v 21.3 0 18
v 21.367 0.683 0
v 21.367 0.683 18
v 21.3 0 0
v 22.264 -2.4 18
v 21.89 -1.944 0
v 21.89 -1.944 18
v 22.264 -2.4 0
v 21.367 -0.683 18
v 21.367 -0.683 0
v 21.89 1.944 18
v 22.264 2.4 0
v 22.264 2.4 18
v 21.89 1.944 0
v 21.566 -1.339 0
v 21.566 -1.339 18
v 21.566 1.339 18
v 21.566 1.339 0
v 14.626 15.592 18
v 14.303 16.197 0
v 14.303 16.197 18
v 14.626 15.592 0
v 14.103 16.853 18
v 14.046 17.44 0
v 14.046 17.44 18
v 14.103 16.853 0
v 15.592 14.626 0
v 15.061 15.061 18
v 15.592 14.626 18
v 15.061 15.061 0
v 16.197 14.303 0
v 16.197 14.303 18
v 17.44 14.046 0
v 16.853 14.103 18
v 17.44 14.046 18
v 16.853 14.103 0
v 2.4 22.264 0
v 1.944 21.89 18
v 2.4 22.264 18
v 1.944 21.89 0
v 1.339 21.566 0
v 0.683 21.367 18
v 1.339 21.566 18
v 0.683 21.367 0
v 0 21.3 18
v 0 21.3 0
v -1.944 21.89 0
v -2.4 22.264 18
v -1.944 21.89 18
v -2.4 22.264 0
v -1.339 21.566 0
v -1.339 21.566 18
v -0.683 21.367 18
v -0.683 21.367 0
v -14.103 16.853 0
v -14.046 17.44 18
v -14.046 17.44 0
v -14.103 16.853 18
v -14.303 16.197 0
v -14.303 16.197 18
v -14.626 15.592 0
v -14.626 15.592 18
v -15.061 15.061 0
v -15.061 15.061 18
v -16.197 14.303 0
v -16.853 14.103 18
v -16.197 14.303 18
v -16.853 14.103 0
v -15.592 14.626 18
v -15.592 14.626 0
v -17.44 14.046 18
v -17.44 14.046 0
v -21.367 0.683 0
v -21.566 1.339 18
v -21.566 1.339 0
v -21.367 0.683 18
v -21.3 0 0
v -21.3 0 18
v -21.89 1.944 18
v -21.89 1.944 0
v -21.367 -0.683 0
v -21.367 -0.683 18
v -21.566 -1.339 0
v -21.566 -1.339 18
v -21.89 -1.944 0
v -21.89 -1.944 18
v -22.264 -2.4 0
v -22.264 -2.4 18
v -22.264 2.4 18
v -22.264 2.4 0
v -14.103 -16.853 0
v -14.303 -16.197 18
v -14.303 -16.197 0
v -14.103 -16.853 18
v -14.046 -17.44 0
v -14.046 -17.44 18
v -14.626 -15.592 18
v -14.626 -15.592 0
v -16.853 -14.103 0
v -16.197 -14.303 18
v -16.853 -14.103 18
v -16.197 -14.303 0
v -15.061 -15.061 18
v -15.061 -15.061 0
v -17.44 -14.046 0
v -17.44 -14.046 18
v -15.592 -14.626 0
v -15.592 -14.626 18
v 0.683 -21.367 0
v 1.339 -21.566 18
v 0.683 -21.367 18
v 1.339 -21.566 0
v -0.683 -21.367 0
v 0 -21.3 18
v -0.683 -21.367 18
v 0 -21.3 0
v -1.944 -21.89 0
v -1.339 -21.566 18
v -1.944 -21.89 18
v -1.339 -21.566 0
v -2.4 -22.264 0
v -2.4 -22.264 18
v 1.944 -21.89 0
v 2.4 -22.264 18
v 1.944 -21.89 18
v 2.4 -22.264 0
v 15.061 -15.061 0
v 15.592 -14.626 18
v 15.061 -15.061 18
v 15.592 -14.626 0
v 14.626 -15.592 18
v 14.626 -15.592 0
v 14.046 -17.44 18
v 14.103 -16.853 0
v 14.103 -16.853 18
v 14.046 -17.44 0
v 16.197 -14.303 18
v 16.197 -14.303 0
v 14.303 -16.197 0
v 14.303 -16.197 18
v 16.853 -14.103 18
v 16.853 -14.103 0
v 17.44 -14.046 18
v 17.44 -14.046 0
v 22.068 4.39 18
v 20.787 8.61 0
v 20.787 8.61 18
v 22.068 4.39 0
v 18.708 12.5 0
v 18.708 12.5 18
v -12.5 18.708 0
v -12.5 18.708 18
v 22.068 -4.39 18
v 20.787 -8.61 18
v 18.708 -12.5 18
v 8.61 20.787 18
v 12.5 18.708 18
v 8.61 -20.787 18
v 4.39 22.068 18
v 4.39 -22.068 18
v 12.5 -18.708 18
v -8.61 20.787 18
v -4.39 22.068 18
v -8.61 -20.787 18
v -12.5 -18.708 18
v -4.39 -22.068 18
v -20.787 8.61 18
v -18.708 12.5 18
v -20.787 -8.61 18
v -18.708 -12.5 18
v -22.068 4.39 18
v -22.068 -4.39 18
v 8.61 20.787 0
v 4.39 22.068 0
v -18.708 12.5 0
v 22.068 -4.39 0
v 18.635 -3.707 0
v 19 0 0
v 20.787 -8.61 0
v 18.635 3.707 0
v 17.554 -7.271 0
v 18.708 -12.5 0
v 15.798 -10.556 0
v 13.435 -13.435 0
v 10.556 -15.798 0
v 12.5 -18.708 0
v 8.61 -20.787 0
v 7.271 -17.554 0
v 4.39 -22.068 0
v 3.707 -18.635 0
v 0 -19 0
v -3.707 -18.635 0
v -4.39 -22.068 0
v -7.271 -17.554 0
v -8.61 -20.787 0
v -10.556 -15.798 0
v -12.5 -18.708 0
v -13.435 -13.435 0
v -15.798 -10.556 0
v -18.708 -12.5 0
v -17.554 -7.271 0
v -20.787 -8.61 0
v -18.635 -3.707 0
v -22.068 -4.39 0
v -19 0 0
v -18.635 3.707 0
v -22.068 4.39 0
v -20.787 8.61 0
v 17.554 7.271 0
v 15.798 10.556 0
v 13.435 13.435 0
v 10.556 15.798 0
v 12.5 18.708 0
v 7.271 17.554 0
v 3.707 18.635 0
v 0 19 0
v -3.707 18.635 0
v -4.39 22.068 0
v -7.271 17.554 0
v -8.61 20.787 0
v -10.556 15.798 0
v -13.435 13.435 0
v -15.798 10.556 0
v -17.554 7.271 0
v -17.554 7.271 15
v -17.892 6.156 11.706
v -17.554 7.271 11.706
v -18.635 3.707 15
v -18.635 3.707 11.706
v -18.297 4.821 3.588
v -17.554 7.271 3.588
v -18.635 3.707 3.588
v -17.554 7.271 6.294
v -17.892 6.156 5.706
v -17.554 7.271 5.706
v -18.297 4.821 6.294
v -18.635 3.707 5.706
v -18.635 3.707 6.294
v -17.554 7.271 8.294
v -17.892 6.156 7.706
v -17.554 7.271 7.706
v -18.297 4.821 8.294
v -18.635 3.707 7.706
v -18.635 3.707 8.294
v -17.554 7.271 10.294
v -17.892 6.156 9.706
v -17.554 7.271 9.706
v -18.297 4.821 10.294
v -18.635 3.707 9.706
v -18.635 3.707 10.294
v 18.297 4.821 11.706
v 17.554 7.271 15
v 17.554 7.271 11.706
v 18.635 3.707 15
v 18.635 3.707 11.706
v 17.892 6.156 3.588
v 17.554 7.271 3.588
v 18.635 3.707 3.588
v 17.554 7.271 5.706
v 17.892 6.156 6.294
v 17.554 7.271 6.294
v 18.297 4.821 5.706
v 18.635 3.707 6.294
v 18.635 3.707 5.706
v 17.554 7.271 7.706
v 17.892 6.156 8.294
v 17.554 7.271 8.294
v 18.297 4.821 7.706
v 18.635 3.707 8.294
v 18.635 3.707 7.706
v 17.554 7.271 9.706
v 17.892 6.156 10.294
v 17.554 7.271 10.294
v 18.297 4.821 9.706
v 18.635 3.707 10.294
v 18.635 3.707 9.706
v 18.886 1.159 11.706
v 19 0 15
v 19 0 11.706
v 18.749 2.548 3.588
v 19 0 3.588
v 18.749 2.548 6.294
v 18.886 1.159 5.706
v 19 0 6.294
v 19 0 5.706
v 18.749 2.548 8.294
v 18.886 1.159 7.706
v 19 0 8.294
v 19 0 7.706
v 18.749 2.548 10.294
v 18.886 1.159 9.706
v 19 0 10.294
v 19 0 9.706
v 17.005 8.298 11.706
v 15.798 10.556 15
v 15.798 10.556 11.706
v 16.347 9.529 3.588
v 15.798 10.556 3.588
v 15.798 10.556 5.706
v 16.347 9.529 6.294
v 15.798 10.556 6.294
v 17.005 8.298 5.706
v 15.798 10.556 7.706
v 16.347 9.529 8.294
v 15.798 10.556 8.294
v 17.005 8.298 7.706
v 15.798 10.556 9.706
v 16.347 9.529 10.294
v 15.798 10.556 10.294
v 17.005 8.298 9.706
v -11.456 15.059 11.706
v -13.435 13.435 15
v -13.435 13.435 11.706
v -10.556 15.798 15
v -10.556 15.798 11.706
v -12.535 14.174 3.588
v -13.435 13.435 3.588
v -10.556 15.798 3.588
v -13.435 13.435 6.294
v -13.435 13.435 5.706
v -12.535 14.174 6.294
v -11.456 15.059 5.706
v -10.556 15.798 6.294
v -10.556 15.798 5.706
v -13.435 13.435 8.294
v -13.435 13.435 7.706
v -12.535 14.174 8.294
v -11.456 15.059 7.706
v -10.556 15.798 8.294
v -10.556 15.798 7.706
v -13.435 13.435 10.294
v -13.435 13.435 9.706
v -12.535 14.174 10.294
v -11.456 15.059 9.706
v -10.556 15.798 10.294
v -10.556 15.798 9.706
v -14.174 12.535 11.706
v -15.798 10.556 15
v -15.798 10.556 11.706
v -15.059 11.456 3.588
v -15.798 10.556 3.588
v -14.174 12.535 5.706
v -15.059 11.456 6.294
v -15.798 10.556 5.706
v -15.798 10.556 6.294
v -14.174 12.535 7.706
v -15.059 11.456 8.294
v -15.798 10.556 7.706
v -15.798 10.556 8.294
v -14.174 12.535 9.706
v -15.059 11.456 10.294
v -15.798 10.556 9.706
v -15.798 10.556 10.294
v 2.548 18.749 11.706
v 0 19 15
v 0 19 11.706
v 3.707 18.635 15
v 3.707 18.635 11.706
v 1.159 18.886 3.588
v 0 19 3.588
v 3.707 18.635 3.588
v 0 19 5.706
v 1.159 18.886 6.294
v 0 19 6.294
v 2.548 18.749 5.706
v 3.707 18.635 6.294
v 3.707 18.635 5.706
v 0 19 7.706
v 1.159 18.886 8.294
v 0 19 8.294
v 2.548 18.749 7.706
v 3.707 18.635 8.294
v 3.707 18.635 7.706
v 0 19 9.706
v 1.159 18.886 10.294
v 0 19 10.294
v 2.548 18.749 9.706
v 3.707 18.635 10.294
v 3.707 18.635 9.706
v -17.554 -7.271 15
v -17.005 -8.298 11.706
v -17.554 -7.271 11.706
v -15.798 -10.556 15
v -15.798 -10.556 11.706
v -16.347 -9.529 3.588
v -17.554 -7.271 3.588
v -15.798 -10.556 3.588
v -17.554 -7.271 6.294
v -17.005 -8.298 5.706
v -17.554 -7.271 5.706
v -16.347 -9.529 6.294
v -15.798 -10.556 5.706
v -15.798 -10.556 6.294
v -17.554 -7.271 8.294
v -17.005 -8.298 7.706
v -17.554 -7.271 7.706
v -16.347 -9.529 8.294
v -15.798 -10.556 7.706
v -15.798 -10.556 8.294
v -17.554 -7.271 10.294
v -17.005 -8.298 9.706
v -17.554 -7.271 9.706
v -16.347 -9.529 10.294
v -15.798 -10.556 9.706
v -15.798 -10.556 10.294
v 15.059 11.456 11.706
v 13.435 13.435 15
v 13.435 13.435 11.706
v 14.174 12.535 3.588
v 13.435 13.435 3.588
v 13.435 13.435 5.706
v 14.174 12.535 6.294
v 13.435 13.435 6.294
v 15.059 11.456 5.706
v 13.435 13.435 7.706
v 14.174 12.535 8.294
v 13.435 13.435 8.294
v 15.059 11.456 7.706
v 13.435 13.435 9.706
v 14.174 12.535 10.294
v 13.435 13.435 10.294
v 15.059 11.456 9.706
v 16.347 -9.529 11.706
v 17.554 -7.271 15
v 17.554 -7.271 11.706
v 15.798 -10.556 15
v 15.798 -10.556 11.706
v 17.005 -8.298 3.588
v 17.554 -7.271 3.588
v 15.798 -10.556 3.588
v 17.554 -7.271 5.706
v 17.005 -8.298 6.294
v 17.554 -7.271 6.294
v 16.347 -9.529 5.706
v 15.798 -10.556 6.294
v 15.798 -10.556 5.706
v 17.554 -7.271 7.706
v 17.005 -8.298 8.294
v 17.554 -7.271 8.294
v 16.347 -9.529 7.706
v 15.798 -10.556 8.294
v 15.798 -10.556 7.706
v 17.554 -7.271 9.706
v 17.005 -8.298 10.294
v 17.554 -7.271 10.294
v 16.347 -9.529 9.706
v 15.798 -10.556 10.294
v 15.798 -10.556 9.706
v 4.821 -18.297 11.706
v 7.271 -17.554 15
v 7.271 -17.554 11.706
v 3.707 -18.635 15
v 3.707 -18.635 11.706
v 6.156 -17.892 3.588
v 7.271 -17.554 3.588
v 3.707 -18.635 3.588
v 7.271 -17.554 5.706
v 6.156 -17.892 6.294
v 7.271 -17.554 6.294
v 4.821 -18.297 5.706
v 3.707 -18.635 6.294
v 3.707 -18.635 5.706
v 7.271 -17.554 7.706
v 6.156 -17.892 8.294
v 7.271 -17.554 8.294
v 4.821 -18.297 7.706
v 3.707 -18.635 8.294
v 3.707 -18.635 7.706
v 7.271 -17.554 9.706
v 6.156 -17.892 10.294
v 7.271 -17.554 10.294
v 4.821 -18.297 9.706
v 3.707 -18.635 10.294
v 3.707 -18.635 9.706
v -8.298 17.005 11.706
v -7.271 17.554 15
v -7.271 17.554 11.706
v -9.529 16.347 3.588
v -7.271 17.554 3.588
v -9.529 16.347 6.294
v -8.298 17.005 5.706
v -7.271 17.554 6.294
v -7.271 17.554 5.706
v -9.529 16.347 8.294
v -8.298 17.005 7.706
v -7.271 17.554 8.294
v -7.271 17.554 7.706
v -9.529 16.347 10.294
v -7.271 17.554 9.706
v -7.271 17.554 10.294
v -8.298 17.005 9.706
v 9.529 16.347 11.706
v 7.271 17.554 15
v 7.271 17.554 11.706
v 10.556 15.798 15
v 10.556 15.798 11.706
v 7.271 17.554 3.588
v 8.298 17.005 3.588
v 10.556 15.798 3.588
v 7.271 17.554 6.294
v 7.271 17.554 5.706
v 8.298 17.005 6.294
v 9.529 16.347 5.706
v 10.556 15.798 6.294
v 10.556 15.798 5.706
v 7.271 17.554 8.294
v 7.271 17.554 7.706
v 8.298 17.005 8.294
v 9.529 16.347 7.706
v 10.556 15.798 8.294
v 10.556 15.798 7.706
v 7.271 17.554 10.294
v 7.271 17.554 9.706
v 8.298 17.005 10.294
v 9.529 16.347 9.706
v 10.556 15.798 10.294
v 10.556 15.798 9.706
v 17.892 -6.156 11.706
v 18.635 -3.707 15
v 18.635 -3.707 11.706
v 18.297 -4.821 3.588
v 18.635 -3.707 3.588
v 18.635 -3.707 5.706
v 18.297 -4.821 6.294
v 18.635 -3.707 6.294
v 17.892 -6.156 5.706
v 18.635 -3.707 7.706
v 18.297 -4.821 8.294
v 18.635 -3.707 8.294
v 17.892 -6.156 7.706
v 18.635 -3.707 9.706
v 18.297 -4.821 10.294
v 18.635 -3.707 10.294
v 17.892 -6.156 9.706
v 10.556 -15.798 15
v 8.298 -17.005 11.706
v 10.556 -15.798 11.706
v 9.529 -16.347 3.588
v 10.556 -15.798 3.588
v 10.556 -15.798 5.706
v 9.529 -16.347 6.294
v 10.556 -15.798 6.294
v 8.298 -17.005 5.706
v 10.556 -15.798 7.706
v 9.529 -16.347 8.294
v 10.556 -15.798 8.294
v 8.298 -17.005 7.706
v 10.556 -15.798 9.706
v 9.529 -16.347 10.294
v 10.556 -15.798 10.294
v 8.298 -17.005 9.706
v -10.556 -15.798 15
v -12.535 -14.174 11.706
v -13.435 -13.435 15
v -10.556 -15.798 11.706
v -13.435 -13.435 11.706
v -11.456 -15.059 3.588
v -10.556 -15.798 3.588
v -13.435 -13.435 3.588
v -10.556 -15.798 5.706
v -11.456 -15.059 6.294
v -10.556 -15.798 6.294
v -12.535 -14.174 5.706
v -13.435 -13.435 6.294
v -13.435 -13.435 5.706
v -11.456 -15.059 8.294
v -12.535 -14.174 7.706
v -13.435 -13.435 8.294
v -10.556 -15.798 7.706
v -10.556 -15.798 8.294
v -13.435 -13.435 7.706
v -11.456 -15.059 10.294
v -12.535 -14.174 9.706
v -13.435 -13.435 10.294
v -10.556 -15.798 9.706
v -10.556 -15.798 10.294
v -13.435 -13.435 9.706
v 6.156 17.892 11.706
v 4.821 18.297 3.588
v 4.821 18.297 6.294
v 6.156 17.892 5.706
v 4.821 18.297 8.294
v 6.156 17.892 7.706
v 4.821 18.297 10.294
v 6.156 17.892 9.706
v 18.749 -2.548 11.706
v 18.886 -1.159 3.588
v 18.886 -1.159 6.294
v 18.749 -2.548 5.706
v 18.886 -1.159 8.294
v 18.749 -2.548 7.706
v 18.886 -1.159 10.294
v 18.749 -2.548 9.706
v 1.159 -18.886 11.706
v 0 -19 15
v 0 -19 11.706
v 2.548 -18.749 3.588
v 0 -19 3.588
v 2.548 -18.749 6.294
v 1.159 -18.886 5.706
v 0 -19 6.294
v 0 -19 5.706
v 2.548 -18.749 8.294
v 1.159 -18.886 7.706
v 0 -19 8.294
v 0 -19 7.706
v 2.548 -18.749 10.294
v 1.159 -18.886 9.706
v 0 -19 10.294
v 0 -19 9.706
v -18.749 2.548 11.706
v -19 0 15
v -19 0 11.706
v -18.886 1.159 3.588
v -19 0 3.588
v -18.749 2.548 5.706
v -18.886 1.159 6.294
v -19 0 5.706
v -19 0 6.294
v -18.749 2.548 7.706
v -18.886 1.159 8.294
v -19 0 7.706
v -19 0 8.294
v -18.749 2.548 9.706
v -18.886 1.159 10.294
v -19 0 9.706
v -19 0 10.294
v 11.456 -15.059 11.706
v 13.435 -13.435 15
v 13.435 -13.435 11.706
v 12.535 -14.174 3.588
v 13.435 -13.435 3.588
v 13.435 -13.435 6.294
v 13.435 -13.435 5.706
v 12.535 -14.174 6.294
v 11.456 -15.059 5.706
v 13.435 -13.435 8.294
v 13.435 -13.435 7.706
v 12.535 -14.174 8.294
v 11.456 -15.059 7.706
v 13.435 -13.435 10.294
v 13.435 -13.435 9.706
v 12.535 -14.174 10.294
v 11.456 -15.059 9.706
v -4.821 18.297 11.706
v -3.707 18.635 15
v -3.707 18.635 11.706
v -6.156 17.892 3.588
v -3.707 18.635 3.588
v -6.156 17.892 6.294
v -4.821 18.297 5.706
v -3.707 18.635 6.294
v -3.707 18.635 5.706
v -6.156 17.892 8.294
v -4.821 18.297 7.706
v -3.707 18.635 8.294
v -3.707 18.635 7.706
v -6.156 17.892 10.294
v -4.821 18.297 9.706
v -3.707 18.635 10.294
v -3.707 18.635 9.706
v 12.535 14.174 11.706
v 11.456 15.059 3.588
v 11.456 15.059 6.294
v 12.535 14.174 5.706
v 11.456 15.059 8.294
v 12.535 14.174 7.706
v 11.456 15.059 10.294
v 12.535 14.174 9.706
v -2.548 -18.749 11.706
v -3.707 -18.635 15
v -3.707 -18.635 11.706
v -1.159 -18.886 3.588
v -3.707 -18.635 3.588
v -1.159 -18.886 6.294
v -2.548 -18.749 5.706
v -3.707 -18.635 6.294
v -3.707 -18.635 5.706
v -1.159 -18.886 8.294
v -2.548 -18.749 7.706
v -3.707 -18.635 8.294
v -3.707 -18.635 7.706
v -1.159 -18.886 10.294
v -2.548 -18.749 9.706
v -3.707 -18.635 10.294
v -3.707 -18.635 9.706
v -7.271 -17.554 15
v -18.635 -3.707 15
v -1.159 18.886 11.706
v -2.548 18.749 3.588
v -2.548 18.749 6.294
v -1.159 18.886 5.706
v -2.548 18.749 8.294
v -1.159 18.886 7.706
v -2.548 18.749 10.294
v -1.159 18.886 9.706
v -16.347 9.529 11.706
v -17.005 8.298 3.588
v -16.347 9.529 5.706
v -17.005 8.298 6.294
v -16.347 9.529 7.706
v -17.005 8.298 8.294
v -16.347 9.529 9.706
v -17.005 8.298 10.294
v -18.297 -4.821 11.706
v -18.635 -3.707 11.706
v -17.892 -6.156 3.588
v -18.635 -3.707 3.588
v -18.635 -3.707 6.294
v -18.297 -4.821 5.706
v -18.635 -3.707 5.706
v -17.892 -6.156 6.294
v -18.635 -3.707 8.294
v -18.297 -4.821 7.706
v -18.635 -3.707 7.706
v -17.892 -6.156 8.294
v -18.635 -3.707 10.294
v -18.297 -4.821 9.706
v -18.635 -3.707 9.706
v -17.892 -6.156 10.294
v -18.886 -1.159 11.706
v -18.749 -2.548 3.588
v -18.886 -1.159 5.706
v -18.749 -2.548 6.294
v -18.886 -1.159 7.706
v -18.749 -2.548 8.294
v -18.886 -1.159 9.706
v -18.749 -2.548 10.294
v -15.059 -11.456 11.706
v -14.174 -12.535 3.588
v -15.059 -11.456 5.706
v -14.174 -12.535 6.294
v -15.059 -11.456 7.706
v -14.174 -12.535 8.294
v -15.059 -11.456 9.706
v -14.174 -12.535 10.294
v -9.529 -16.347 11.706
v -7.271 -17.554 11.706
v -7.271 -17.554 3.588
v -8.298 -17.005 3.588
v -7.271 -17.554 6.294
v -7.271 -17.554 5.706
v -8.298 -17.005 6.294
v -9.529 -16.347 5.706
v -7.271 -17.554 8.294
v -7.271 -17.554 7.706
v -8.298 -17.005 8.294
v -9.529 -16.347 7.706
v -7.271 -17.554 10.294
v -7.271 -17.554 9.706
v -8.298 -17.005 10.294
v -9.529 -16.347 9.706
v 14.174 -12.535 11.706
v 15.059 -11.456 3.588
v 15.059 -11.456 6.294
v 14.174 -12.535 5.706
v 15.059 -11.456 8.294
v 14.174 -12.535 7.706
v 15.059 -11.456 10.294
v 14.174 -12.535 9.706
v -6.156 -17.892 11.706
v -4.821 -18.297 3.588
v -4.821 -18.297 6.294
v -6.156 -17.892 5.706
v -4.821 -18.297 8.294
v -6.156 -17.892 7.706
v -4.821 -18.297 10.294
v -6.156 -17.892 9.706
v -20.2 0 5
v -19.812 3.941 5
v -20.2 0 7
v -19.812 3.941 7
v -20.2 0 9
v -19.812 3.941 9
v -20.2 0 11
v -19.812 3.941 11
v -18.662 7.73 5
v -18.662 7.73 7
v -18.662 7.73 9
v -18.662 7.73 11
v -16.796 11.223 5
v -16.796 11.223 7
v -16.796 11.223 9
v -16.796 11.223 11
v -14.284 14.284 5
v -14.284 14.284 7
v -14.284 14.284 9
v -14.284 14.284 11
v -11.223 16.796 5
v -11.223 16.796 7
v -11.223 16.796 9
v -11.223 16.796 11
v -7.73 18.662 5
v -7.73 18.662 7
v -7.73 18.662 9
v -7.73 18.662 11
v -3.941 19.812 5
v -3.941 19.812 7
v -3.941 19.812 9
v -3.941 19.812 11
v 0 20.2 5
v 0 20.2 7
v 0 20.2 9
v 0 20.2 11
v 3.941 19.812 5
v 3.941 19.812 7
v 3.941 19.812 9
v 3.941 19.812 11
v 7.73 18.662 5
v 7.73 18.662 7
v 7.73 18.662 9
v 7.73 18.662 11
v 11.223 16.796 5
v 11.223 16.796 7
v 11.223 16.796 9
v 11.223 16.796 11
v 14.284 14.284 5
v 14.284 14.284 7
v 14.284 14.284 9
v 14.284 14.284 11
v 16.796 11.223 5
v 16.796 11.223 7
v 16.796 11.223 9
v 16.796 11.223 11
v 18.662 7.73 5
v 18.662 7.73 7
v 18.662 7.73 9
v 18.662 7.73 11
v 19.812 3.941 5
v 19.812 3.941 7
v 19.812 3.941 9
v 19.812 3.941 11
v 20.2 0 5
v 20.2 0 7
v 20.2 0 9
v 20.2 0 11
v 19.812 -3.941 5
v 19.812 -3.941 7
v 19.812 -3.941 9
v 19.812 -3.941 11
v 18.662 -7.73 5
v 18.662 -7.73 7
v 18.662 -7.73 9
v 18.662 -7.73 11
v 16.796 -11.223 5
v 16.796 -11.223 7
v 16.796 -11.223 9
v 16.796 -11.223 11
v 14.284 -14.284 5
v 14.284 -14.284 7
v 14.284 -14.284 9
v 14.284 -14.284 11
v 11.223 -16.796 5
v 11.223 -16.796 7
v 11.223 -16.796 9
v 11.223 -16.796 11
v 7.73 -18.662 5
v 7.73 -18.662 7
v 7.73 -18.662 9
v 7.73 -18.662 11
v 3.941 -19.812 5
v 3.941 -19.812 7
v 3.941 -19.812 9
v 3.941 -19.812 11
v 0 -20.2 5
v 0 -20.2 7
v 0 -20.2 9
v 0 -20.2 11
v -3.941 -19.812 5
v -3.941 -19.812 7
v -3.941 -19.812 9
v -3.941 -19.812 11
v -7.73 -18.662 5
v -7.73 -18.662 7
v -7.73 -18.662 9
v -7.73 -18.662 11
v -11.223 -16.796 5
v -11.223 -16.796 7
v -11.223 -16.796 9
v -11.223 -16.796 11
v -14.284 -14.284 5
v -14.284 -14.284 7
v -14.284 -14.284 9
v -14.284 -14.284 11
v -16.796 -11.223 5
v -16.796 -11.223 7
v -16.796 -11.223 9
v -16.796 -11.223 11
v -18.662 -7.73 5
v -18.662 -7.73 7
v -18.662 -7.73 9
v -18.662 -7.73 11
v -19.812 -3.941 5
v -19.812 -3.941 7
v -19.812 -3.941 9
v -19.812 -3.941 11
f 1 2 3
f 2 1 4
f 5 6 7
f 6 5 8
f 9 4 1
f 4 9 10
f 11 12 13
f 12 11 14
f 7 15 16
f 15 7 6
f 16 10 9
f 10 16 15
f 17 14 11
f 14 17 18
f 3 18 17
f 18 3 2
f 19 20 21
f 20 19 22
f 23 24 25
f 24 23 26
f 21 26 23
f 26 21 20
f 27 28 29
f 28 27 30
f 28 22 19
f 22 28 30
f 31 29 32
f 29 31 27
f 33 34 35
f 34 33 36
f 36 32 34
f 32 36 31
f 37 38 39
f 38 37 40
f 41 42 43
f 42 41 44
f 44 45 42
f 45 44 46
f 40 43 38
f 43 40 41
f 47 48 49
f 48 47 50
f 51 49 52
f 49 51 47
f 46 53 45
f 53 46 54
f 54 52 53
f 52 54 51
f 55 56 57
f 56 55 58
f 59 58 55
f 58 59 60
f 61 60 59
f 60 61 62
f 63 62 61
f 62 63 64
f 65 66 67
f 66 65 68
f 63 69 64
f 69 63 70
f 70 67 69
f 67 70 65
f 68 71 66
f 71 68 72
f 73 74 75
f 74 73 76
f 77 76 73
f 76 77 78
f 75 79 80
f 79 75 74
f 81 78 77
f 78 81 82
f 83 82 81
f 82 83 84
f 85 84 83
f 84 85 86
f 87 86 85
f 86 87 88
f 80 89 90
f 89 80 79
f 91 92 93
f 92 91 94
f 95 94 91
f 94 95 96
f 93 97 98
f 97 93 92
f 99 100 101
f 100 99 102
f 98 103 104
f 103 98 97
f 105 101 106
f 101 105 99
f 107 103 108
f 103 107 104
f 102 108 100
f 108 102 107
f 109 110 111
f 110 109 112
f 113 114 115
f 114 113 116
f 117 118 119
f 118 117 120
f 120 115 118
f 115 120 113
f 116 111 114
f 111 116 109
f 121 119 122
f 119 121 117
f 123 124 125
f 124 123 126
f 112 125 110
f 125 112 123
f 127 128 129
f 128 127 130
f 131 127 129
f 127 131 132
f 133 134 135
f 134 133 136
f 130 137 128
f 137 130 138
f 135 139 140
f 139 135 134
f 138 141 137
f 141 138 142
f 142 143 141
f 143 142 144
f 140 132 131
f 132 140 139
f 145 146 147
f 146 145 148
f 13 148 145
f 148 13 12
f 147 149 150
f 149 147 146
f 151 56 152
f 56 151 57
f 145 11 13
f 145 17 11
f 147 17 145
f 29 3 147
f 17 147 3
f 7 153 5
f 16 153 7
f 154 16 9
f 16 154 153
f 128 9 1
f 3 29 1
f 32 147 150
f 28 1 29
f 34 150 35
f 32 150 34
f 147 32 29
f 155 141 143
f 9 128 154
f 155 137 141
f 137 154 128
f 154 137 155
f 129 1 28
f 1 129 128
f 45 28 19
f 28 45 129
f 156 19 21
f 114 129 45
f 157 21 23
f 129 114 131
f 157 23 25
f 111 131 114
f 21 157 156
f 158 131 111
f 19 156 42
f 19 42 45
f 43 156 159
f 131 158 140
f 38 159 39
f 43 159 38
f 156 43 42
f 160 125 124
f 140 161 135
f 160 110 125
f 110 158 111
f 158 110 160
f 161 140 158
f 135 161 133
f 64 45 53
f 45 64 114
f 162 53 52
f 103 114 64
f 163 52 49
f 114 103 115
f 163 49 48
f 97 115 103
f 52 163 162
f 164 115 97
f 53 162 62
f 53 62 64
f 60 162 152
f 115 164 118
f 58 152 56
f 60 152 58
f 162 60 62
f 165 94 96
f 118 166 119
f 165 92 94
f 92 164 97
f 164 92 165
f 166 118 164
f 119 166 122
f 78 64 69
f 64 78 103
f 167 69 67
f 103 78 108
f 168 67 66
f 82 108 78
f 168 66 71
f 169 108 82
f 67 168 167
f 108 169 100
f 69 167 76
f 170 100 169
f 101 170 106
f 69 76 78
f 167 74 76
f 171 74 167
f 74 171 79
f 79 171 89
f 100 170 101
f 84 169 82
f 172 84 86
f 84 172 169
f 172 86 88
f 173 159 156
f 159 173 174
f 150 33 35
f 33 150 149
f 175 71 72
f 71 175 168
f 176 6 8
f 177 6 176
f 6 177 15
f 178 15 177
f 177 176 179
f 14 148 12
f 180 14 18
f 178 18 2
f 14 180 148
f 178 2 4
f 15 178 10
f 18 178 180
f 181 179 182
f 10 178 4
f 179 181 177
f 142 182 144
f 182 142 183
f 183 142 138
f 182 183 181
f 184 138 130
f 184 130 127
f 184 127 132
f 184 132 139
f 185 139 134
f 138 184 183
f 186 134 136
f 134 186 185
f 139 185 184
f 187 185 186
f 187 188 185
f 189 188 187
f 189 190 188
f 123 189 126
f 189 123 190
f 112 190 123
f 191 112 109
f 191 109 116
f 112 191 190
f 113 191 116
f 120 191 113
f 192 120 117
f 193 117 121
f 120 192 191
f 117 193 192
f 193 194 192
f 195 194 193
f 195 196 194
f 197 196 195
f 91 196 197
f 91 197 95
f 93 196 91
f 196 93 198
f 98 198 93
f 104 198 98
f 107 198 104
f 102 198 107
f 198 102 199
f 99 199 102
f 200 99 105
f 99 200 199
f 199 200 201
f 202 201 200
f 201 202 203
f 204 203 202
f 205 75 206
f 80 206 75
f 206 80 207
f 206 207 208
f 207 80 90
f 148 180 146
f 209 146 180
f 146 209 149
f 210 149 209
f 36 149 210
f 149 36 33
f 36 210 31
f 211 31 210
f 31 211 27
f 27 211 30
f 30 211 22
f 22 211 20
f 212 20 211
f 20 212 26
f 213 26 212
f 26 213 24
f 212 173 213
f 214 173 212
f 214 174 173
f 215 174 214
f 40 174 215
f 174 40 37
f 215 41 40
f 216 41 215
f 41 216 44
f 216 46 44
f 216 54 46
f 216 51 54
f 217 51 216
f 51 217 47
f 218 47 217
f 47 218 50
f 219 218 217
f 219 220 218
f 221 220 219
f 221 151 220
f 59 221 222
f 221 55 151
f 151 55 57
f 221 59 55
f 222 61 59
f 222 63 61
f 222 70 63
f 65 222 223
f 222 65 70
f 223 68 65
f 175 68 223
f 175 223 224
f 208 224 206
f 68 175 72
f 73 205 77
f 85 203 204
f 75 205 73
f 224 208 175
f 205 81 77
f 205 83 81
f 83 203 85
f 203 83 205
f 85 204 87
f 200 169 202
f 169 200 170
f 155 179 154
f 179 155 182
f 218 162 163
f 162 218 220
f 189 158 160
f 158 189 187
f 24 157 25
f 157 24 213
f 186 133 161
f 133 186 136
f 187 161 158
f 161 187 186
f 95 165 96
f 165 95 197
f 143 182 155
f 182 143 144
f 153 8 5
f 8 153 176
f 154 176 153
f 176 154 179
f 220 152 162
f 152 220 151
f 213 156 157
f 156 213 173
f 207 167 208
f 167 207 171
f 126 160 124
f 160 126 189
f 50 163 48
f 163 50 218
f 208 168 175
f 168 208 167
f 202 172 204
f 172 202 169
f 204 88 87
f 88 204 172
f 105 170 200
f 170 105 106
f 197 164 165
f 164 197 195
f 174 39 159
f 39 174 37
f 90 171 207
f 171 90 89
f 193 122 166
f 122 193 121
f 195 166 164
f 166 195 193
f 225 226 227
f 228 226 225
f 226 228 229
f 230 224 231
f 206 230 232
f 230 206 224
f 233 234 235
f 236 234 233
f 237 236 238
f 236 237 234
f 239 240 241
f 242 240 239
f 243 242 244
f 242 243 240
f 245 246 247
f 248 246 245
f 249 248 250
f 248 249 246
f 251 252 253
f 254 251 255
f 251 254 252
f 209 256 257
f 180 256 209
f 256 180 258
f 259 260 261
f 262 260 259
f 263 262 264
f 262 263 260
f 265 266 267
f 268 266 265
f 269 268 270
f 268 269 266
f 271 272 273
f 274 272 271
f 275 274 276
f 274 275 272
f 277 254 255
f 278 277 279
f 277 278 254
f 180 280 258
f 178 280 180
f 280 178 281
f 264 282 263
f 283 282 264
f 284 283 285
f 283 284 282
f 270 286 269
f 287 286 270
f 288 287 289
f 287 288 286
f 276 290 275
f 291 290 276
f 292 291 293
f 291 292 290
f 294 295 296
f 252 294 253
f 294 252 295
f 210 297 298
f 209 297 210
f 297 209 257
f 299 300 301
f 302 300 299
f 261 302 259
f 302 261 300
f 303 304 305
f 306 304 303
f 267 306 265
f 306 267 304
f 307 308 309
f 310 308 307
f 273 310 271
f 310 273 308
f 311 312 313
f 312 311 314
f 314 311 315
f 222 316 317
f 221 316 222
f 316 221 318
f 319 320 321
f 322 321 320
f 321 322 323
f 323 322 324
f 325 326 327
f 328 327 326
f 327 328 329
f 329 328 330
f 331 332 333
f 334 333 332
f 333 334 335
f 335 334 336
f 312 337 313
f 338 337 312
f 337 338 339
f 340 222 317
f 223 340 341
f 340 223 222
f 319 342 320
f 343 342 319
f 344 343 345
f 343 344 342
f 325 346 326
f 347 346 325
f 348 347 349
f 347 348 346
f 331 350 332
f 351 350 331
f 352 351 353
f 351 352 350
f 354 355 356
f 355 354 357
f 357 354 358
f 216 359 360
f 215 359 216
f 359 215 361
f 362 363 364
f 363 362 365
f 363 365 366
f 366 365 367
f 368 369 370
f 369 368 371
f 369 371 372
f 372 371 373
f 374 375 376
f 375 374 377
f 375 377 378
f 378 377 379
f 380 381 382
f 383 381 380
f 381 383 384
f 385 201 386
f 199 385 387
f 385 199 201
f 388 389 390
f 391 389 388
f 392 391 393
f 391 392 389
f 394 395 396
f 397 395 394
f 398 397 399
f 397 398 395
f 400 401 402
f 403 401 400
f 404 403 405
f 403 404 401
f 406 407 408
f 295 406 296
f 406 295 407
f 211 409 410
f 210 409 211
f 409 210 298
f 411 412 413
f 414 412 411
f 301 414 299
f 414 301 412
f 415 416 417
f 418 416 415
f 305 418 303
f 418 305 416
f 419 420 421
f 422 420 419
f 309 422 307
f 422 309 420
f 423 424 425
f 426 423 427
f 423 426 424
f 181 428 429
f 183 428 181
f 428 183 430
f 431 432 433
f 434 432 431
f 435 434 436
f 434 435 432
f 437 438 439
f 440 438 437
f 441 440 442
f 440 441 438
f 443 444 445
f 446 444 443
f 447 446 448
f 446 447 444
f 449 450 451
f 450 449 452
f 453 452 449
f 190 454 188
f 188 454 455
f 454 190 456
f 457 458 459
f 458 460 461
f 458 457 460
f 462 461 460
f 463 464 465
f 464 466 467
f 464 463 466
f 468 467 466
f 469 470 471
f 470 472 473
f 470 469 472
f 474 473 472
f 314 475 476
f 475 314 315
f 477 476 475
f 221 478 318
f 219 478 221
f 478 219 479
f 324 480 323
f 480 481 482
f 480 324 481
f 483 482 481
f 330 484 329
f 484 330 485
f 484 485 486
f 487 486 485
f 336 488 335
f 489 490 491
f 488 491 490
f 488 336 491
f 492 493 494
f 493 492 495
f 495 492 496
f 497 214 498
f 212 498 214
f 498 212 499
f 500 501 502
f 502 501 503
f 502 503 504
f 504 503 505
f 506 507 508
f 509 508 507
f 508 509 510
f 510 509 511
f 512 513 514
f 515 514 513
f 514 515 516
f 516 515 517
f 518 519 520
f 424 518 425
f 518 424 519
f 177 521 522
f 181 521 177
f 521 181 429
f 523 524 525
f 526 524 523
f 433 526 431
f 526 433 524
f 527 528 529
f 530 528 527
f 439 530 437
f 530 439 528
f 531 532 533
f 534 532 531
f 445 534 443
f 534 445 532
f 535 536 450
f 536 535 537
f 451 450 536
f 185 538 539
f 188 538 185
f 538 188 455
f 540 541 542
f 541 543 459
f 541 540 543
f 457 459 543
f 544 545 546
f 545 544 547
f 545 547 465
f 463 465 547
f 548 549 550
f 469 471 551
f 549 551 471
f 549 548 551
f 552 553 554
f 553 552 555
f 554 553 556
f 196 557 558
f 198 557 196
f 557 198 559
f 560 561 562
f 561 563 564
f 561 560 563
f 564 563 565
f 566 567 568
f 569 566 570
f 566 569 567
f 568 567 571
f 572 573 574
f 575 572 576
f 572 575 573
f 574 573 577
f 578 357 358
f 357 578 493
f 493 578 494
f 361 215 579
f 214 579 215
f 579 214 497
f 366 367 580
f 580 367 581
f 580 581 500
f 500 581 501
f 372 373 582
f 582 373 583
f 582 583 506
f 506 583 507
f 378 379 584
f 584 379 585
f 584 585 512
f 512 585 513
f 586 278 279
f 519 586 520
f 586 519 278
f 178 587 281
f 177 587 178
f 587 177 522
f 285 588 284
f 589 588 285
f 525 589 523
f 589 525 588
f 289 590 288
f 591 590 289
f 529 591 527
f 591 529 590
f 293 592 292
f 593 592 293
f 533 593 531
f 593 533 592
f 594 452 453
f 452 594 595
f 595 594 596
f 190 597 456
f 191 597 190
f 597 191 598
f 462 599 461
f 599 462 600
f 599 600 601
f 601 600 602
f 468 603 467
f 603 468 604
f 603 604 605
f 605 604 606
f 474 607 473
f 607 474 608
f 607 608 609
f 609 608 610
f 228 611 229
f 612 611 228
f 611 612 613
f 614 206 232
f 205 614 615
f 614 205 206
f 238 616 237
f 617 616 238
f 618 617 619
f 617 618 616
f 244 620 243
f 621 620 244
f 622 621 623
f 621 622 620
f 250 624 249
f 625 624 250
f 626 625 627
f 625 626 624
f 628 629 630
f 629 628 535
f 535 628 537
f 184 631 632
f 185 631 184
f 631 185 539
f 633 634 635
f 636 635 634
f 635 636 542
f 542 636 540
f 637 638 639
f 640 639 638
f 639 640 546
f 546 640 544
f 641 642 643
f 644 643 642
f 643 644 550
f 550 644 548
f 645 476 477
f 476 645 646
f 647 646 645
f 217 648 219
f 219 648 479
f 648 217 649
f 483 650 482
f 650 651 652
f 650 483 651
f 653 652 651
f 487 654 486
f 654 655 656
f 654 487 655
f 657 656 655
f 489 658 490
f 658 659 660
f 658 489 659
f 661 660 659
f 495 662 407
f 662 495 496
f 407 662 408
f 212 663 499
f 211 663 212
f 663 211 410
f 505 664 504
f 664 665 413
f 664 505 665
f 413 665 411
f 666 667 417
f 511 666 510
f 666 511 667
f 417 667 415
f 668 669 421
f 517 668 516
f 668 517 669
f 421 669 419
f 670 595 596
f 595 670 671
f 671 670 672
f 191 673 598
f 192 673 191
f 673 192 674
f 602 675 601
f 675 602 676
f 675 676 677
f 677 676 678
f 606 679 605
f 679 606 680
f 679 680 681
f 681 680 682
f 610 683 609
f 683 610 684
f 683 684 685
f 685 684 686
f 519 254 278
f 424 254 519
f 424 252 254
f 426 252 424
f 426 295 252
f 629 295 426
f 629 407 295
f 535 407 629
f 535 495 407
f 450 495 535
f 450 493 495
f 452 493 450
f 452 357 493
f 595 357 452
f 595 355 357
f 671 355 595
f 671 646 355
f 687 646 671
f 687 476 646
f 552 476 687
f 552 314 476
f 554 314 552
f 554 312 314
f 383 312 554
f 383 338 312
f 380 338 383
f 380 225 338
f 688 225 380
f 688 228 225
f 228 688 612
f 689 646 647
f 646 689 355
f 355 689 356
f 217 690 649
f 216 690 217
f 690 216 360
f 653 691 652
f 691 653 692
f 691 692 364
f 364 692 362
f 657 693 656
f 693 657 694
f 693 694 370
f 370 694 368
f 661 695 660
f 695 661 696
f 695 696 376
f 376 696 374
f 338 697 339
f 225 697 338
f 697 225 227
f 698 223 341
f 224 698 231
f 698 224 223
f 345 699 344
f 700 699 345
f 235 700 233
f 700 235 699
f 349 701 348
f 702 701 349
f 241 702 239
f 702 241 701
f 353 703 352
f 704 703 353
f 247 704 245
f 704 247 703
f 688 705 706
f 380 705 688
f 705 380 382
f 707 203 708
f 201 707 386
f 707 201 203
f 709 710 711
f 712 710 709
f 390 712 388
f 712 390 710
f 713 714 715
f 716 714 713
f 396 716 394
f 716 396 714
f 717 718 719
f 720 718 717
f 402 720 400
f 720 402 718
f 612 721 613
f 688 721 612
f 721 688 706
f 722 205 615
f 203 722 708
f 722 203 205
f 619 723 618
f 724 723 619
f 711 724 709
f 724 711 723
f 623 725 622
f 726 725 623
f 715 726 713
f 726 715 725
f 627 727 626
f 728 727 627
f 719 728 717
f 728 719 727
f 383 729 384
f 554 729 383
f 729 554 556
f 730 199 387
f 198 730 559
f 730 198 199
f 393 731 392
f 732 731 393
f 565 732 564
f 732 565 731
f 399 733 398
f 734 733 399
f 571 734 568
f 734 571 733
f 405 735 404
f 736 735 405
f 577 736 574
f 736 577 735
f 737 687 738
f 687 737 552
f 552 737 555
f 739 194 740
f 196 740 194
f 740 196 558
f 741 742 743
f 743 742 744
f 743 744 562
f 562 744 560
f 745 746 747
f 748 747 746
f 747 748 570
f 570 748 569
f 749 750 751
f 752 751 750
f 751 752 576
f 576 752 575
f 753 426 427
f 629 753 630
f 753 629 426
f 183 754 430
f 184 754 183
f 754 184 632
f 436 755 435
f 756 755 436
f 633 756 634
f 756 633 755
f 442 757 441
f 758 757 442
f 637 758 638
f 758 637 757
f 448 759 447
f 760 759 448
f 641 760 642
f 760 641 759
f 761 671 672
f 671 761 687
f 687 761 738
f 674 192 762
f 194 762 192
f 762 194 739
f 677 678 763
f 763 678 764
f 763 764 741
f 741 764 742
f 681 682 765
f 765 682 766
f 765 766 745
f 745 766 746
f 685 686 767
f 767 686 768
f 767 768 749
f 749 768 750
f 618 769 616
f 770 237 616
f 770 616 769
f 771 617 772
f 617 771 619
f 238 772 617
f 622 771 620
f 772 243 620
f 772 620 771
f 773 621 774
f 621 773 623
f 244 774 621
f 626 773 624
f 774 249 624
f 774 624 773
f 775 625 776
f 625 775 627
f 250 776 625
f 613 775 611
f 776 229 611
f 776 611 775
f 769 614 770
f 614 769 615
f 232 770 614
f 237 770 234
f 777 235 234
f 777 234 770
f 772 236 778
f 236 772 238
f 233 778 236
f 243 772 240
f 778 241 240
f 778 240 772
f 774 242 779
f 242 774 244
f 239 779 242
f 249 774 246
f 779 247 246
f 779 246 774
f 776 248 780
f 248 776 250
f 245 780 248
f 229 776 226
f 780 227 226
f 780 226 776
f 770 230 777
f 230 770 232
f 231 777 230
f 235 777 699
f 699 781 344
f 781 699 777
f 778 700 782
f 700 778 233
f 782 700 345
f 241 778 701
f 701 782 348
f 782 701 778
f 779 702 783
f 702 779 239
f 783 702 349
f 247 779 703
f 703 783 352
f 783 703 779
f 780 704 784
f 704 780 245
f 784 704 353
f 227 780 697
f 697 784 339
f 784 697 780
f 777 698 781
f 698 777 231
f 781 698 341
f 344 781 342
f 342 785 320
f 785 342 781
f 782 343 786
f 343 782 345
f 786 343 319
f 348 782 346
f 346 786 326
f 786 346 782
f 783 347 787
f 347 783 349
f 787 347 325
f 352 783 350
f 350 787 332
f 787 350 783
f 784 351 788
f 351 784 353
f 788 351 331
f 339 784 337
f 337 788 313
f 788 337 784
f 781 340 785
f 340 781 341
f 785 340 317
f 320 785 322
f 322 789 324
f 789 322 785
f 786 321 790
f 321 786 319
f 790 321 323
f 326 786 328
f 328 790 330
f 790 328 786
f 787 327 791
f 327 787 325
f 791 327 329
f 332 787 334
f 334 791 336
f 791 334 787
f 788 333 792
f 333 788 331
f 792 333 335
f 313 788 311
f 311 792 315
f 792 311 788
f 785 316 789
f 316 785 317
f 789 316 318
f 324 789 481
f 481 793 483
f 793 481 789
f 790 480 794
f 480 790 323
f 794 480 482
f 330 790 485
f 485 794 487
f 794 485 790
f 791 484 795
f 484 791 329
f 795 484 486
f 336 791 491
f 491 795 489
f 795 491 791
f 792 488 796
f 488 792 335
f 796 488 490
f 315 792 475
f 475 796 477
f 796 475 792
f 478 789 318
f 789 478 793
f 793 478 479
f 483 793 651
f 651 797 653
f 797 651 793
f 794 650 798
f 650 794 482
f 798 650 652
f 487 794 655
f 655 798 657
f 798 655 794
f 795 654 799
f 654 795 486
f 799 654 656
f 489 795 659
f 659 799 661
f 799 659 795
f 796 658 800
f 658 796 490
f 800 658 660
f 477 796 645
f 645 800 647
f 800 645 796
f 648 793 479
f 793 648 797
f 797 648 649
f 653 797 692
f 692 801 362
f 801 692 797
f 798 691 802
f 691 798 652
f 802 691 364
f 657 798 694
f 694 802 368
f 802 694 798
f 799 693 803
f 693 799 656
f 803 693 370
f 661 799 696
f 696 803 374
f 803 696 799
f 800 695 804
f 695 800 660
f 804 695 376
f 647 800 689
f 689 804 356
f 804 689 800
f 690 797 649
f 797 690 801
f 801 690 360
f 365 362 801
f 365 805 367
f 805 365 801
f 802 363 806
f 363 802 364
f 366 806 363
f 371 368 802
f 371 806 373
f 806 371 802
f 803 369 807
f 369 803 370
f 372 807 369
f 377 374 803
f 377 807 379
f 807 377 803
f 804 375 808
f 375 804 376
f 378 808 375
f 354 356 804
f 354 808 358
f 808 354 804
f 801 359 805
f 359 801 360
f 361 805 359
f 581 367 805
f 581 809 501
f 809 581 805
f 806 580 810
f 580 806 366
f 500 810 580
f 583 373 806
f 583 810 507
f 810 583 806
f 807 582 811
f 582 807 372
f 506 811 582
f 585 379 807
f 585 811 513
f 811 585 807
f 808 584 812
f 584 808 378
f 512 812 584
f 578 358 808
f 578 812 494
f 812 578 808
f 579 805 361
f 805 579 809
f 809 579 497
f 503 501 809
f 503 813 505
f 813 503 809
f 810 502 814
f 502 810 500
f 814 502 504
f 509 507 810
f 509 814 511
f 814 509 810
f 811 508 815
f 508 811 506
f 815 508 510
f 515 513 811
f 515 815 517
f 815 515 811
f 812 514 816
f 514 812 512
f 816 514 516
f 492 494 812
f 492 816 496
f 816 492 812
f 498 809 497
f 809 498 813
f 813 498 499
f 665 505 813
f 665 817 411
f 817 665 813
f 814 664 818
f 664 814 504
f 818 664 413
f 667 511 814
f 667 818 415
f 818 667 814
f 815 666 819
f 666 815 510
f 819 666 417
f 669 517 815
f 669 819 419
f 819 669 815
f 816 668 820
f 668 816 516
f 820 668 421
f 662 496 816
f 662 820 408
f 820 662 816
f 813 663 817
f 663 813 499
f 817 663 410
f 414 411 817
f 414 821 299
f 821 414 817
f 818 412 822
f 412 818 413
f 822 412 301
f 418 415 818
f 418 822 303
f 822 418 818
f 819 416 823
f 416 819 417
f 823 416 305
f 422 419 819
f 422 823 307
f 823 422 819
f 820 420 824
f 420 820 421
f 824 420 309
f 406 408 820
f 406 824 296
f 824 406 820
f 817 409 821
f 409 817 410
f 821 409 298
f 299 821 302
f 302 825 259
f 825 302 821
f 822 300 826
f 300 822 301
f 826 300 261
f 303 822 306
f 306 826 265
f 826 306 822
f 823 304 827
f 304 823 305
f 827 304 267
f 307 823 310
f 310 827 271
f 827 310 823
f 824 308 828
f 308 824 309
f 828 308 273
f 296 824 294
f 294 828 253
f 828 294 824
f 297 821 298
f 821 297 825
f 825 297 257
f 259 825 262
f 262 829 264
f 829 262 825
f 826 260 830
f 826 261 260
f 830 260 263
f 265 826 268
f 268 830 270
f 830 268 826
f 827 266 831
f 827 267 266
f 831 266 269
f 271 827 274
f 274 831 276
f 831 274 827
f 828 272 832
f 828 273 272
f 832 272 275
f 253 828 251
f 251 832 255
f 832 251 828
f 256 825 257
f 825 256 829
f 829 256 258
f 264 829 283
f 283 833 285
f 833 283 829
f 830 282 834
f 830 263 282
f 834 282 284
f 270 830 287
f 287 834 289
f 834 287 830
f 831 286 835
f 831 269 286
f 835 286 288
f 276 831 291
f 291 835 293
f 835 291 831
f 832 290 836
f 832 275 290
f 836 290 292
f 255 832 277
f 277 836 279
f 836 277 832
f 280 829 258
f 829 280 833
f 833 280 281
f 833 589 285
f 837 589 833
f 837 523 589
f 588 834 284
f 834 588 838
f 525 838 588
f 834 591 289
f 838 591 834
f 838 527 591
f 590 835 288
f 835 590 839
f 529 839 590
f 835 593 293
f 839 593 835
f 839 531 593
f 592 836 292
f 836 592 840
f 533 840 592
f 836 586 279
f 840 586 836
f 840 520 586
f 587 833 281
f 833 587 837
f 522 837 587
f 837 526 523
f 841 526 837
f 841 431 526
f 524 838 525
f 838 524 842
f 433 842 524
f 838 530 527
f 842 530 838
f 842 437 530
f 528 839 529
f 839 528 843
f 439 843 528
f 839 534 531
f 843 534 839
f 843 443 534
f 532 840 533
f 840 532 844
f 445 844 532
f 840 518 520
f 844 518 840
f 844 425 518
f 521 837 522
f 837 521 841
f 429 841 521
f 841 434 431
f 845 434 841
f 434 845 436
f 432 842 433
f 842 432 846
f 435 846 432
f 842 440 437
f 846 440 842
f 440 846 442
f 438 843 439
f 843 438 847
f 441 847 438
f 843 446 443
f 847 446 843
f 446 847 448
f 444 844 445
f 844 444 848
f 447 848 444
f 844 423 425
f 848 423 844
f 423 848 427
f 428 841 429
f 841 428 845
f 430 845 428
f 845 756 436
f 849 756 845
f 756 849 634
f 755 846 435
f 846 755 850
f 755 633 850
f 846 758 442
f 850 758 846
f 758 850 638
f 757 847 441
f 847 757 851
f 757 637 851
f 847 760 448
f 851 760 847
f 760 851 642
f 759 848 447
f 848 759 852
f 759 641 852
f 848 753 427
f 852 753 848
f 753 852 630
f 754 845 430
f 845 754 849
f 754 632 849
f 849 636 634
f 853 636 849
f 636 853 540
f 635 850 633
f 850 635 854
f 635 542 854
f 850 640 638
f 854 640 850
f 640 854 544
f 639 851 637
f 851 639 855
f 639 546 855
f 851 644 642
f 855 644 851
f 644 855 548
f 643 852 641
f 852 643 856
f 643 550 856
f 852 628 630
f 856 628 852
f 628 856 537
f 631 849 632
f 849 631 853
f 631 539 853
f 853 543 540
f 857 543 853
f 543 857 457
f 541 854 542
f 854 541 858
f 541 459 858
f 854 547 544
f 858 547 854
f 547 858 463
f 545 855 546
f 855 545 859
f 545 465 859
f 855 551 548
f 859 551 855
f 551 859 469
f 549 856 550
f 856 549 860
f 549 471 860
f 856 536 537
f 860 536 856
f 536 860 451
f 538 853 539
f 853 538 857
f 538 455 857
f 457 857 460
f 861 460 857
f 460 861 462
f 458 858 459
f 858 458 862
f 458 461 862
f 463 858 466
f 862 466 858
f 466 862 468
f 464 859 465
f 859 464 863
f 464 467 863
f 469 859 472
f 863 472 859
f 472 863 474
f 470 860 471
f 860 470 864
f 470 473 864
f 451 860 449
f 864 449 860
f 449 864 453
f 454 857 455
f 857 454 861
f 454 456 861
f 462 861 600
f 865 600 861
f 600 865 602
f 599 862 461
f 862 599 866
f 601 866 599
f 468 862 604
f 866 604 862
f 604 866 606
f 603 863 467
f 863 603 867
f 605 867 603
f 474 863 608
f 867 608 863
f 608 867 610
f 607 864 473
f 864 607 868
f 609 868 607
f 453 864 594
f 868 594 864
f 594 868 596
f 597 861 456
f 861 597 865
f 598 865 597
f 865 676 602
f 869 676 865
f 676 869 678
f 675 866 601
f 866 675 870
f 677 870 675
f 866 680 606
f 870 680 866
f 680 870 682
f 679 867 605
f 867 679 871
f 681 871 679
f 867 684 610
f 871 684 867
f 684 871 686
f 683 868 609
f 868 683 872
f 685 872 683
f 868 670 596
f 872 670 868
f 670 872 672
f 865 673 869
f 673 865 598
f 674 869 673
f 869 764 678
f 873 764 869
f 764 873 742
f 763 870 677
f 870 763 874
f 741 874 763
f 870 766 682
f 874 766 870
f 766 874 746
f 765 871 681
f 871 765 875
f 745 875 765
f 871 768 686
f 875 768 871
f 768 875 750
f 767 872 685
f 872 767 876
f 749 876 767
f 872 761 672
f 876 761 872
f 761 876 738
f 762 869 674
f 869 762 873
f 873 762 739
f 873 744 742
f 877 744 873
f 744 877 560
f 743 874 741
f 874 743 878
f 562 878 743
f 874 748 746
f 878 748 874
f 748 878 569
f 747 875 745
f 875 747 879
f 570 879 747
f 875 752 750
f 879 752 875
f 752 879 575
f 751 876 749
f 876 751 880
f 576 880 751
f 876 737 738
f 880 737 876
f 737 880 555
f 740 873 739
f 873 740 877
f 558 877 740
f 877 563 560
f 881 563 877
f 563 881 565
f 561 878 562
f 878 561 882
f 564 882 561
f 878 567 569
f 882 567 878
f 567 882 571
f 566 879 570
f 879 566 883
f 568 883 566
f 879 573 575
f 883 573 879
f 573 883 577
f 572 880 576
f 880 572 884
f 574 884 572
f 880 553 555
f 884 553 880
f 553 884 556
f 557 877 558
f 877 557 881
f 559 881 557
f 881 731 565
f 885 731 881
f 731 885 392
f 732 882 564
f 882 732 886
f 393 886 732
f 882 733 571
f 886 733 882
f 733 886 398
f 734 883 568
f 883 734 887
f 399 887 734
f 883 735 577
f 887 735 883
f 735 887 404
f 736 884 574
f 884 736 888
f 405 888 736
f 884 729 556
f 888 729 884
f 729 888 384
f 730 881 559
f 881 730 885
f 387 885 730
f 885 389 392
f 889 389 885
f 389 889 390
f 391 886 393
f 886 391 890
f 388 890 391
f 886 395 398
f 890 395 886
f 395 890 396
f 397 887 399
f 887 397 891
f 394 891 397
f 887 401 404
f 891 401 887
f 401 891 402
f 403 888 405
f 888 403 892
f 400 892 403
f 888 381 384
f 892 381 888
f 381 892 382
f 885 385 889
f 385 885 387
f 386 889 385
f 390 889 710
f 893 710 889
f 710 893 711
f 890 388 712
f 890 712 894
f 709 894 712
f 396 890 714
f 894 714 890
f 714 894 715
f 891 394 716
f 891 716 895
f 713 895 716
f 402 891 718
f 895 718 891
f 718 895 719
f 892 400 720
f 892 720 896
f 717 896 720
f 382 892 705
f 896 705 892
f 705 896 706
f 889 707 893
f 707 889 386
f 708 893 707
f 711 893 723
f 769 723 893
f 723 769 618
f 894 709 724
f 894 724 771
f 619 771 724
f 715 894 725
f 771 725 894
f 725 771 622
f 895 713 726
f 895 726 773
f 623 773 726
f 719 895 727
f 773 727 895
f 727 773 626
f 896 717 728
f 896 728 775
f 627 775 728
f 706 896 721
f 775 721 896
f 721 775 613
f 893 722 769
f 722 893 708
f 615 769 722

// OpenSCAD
$fn = 32;

// ----------------------------------------------------------------------
// Threaded cap: 45 mm body, 18 mm tall, 38 mm threaded bore
// ----------------------------------------------------------------------

// --- parameters (mm) ---
outer_d = 45;             // cap outside diameter
body_h = 18;              // cap height
top_t = 3;                // closed top thickness
bore_d = 38;              // bore core diameter
pitch = 2;                // thread pitch
thread_d = 1.2;           // thread depth
thread_z = 3;             // thread start above the rim
thread_h = 9;             // threaded height
flutes = 8;               // number of knurl flutes
flute_d = 7;              // flute cutter diameter
flute_depth = 1.2;        // flute depth into the rim

difference() {
  union() {
    cylinder(h = 18, d = outer_d);
  }
  /* threaded bore, closed at the top */
  translate([0, 0, -2.5]) cylinder(h = 17.5, d = bore_d);
  translate([0, 0, 3]) rotate_extrude() polygon([[18, 0], [18, 9], [18.5, 9], [20.2, 8], [18.5, 7], [20.2, 6], [18.5, 5], [20.2, 4], [18.5, 3], [20.2, 2], [18.5, 0], [18, 0]]);
  /* knurl flutes around the rim */
  for (i = [0 : flutes - 1]) {
    a = i * 360 / flutes;
    translate([(outer_d / 2 + flute_d / 2 - flute_depth) * cos(a), (outer_d / 2 + flute_d / 2 - flute_depth) * sin(a), -2.5]) cylinder(h = body_h + 5, d = flute_d);
  }
}
